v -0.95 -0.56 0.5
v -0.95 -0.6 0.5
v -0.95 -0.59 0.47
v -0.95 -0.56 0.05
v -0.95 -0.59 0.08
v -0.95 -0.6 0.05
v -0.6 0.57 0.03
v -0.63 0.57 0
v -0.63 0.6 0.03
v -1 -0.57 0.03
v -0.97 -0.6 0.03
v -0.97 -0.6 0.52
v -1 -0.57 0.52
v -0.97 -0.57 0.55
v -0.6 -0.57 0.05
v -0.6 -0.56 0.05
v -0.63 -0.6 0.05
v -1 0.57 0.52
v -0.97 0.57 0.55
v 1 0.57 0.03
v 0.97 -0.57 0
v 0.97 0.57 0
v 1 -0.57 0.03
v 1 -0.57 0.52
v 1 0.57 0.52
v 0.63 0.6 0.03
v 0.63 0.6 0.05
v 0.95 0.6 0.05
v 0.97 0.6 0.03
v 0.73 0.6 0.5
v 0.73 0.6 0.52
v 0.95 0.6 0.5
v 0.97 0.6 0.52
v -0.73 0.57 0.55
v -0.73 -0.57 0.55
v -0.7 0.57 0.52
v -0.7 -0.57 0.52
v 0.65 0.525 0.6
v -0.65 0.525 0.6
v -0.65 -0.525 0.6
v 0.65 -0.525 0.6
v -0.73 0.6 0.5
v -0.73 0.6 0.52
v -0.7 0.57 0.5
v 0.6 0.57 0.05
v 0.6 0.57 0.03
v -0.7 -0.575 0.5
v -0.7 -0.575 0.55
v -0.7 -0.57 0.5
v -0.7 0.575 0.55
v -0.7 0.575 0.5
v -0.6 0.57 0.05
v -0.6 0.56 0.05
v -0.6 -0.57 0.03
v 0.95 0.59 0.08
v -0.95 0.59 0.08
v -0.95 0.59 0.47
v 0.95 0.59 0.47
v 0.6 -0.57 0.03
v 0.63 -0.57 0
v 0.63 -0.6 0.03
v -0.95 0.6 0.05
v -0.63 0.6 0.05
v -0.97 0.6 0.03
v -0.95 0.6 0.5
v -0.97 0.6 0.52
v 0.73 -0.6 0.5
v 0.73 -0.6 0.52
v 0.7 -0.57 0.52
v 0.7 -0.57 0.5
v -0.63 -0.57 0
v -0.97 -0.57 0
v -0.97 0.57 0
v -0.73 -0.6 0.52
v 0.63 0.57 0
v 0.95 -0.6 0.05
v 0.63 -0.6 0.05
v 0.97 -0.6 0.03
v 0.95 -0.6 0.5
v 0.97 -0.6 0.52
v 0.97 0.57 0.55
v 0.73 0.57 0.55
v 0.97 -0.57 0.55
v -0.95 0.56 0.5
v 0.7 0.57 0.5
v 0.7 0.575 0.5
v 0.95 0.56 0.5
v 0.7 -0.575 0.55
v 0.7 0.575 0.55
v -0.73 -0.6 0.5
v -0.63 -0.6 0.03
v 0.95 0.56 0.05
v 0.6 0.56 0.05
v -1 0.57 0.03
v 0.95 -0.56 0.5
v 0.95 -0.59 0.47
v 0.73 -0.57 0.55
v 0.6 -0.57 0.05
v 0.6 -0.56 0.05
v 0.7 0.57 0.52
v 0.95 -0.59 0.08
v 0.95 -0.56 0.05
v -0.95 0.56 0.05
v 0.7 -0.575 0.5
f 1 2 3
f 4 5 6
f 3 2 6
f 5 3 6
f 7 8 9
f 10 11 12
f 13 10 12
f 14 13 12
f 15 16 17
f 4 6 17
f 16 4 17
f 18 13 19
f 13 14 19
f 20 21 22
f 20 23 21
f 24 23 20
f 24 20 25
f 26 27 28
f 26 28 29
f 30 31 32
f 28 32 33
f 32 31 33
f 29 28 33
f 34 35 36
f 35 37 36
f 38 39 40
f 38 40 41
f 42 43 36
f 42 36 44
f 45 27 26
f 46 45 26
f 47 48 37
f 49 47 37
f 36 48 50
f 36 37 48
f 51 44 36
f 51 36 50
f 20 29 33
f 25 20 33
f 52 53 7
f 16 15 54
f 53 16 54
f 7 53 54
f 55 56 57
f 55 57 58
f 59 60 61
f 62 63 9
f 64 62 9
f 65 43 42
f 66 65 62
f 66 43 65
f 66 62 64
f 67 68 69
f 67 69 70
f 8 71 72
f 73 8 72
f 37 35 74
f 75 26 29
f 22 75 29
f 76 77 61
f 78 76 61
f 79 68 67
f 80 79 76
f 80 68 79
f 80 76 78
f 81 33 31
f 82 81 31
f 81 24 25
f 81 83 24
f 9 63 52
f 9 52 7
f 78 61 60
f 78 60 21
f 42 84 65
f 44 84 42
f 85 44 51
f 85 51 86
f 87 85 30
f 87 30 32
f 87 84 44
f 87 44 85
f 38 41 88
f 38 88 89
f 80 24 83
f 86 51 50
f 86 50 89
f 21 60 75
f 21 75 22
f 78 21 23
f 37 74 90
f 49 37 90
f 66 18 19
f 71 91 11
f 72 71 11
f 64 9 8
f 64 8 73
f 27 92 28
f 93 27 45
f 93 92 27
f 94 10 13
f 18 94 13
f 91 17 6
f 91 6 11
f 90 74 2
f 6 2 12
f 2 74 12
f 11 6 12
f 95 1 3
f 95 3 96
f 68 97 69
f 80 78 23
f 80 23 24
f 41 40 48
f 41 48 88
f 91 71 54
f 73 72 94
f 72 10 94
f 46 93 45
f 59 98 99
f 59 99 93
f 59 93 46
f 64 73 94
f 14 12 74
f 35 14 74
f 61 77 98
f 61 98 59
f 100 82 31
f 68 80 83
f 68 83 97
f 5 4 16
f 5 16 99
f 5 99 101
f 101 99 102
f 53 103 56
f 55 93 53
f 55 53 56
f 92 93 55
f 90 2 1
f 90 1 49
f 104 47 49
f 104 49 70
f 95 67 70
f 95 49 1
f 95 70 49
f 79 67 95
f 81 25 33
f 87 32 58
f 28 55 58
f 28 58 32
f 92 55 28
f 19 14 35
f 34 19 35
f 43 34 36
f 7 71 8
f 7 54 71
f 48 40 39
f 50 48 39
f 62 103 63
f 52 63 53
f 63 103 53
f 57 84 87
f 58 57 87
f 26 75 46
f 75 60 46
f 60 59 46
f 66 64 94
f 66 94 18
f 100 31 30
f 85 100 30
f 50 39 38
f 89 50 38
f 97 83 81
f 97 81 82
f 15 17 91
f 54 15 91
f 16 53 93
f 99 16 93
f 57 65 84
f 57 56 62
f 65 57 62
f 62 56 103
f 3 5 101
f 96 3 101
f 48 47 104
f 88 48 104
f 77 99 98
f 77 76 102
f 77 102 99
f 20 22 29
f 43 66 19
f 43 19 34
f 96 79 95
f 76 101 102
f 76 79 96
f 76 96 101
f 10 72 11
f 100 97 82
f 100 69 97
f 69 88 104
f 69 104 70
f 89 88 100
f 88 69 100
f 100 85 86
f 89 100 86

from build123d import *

# Parameters (mm, degrees)
BOX_W                          = 1.9
BOX_H                          = 1.18
BOX_DEPTH                      = 0.45
CHAMFER_SIZE                   = 0.03
EXTRUDE_DEPTH                  = 1.2
EXTRUDE_ONTO_SKETCH_ROLL_ANGLE = 90
CHAMFER001_SIZE                = 0.03
BOX001_W                       = 1.4
BOX001_H                       = 1.15
BOX001_DEPTH                   = 0.1
CHAMFER002_SIZE                = 0.05


with BuildPart() as chamferbody:
    # Box → Box (new body)
    with BuildSketch(Plane(origin=(-0.95, 0.01, 0.05), x_dir=(1, 0, 0), z_dir=(0, 0, 1))):
        with Locations((0.95, 0.59)):
            Rectangle(BOX_W, BOX_H)
    extrude(amount=BOX_DEPTH)

    # Chamfer
    chamfer_edges = [chamferbody.edges().sort_by_distance(p)[0] for p in [
        (0, 0.01, 0.05),
        (0, 0.01, 0.5),
        (0, 1.19, 0.05),
        (0, 1.19, 0.5),
    ]]
    chamfer(chamfer_edges, length=CHAMFER_SIZE)


with BuildPart() as chamferpads:
    # Sketch as drawn → Extrude (new)
    with BuildSketch(Plane.XY):
        Polygon((-0.6, 0), (-1, 0), (-1, 0.55), (-0.7, 0.55), (-0.7, 0.5), (-0.95, 0.5), (-0.95, 0.05), (-0.6, 0.05), align=None)
    extrude(amount=-EXTRUDE_DEPTH)


with BuildPart() as chamferpads_1:
    # Extrude onto Sketch roll: moved
    add(chamferpads.part.rotate(Axis((0, 0, 0), (1, 0, 0)), EXTRUDE_ONTO_SKETCH_ROLL_ANGLE))


with BuildPart() as chamferpads_2:
    # Extrude onto Sketch placement: moved
    add(chamferpads_1.part)

    # Chamfer001
    chamfer001_edges = [chamferpads_2.edges().sort_by_distance(p)[0] for p in [
        (-0.6, 0.6, 0),
        (-1, 0.6, 0),
        (-0.8, 0, 0),
        (-0.8, 1.2, 0),
        (-1, 0.6, 0.55),
        (-1, 0, 0.275),
        (-1, 1.2, 0.275),
        (-0.7, 0.6, 0.55),
        (-0.85, 0, 0.55),
        (-0.85, 1.2, 0.55),
        (-0.7, 0, 0.525),
        (-0.7, 1.2, 0.525),
        (-0.6, 0, 0.025),
        (-0.6, 1.2, 0.025),
    ]]
    chamfer(chamfer001_edges, length=CHAMFER001_SIZE)


with BuildPart() as part_mirroring:
    # Part__Mirroring: instance of ChamferPads
    add(chamferpads_2.part.mirror(Plane(origin=(0, 0, 0), x_dir=(0, -1, 0), z_dir=(1, 0, 0))))


with BuildPart() as fusion:
    # Fusion base: copy of ChamferPads
    add(chamferpads_2.part)

    # Fusion: union Part__Mirroring
    add(part_mirroring.part)


with BuildPart() as fusion001:
    # Box001 → Box001 (new body)
    with BuildSketch(Plane(origin=(-0.7, 0.025, 0.5), x_dir=(1, 0, 0), z_dir=(0, 0, 1))):
        with Locations((0.7, 0.575)):
            Rectangle(BOX001_W, BOX001_H)
    extrude(amount=BOX001_DEPTH)

    # Chamfer002
    chamfer002_edges = [fusion001.edges().sort_by_distance(p)[0] for p in [
        (-0.7, 0.6, 0.6),
        (0.7, 0.6, 0.6),
        (0, 0.025, 0.6),
        (0, 1.175, 0.6),
    ]]
    chamfer(chamfer002_edges, length=CHAMFER002_SIZE)

    # Fusion001: union ChamferBody, Fusion
    add(chamferbody.part)
    add(fusion.part)


with BuildPart() as fusion001_1:
    # Fusion001 placement: moved
    add(fusion001.part.moved(Location((0, -0.6, 0))))


solid = fusion001_1.part
